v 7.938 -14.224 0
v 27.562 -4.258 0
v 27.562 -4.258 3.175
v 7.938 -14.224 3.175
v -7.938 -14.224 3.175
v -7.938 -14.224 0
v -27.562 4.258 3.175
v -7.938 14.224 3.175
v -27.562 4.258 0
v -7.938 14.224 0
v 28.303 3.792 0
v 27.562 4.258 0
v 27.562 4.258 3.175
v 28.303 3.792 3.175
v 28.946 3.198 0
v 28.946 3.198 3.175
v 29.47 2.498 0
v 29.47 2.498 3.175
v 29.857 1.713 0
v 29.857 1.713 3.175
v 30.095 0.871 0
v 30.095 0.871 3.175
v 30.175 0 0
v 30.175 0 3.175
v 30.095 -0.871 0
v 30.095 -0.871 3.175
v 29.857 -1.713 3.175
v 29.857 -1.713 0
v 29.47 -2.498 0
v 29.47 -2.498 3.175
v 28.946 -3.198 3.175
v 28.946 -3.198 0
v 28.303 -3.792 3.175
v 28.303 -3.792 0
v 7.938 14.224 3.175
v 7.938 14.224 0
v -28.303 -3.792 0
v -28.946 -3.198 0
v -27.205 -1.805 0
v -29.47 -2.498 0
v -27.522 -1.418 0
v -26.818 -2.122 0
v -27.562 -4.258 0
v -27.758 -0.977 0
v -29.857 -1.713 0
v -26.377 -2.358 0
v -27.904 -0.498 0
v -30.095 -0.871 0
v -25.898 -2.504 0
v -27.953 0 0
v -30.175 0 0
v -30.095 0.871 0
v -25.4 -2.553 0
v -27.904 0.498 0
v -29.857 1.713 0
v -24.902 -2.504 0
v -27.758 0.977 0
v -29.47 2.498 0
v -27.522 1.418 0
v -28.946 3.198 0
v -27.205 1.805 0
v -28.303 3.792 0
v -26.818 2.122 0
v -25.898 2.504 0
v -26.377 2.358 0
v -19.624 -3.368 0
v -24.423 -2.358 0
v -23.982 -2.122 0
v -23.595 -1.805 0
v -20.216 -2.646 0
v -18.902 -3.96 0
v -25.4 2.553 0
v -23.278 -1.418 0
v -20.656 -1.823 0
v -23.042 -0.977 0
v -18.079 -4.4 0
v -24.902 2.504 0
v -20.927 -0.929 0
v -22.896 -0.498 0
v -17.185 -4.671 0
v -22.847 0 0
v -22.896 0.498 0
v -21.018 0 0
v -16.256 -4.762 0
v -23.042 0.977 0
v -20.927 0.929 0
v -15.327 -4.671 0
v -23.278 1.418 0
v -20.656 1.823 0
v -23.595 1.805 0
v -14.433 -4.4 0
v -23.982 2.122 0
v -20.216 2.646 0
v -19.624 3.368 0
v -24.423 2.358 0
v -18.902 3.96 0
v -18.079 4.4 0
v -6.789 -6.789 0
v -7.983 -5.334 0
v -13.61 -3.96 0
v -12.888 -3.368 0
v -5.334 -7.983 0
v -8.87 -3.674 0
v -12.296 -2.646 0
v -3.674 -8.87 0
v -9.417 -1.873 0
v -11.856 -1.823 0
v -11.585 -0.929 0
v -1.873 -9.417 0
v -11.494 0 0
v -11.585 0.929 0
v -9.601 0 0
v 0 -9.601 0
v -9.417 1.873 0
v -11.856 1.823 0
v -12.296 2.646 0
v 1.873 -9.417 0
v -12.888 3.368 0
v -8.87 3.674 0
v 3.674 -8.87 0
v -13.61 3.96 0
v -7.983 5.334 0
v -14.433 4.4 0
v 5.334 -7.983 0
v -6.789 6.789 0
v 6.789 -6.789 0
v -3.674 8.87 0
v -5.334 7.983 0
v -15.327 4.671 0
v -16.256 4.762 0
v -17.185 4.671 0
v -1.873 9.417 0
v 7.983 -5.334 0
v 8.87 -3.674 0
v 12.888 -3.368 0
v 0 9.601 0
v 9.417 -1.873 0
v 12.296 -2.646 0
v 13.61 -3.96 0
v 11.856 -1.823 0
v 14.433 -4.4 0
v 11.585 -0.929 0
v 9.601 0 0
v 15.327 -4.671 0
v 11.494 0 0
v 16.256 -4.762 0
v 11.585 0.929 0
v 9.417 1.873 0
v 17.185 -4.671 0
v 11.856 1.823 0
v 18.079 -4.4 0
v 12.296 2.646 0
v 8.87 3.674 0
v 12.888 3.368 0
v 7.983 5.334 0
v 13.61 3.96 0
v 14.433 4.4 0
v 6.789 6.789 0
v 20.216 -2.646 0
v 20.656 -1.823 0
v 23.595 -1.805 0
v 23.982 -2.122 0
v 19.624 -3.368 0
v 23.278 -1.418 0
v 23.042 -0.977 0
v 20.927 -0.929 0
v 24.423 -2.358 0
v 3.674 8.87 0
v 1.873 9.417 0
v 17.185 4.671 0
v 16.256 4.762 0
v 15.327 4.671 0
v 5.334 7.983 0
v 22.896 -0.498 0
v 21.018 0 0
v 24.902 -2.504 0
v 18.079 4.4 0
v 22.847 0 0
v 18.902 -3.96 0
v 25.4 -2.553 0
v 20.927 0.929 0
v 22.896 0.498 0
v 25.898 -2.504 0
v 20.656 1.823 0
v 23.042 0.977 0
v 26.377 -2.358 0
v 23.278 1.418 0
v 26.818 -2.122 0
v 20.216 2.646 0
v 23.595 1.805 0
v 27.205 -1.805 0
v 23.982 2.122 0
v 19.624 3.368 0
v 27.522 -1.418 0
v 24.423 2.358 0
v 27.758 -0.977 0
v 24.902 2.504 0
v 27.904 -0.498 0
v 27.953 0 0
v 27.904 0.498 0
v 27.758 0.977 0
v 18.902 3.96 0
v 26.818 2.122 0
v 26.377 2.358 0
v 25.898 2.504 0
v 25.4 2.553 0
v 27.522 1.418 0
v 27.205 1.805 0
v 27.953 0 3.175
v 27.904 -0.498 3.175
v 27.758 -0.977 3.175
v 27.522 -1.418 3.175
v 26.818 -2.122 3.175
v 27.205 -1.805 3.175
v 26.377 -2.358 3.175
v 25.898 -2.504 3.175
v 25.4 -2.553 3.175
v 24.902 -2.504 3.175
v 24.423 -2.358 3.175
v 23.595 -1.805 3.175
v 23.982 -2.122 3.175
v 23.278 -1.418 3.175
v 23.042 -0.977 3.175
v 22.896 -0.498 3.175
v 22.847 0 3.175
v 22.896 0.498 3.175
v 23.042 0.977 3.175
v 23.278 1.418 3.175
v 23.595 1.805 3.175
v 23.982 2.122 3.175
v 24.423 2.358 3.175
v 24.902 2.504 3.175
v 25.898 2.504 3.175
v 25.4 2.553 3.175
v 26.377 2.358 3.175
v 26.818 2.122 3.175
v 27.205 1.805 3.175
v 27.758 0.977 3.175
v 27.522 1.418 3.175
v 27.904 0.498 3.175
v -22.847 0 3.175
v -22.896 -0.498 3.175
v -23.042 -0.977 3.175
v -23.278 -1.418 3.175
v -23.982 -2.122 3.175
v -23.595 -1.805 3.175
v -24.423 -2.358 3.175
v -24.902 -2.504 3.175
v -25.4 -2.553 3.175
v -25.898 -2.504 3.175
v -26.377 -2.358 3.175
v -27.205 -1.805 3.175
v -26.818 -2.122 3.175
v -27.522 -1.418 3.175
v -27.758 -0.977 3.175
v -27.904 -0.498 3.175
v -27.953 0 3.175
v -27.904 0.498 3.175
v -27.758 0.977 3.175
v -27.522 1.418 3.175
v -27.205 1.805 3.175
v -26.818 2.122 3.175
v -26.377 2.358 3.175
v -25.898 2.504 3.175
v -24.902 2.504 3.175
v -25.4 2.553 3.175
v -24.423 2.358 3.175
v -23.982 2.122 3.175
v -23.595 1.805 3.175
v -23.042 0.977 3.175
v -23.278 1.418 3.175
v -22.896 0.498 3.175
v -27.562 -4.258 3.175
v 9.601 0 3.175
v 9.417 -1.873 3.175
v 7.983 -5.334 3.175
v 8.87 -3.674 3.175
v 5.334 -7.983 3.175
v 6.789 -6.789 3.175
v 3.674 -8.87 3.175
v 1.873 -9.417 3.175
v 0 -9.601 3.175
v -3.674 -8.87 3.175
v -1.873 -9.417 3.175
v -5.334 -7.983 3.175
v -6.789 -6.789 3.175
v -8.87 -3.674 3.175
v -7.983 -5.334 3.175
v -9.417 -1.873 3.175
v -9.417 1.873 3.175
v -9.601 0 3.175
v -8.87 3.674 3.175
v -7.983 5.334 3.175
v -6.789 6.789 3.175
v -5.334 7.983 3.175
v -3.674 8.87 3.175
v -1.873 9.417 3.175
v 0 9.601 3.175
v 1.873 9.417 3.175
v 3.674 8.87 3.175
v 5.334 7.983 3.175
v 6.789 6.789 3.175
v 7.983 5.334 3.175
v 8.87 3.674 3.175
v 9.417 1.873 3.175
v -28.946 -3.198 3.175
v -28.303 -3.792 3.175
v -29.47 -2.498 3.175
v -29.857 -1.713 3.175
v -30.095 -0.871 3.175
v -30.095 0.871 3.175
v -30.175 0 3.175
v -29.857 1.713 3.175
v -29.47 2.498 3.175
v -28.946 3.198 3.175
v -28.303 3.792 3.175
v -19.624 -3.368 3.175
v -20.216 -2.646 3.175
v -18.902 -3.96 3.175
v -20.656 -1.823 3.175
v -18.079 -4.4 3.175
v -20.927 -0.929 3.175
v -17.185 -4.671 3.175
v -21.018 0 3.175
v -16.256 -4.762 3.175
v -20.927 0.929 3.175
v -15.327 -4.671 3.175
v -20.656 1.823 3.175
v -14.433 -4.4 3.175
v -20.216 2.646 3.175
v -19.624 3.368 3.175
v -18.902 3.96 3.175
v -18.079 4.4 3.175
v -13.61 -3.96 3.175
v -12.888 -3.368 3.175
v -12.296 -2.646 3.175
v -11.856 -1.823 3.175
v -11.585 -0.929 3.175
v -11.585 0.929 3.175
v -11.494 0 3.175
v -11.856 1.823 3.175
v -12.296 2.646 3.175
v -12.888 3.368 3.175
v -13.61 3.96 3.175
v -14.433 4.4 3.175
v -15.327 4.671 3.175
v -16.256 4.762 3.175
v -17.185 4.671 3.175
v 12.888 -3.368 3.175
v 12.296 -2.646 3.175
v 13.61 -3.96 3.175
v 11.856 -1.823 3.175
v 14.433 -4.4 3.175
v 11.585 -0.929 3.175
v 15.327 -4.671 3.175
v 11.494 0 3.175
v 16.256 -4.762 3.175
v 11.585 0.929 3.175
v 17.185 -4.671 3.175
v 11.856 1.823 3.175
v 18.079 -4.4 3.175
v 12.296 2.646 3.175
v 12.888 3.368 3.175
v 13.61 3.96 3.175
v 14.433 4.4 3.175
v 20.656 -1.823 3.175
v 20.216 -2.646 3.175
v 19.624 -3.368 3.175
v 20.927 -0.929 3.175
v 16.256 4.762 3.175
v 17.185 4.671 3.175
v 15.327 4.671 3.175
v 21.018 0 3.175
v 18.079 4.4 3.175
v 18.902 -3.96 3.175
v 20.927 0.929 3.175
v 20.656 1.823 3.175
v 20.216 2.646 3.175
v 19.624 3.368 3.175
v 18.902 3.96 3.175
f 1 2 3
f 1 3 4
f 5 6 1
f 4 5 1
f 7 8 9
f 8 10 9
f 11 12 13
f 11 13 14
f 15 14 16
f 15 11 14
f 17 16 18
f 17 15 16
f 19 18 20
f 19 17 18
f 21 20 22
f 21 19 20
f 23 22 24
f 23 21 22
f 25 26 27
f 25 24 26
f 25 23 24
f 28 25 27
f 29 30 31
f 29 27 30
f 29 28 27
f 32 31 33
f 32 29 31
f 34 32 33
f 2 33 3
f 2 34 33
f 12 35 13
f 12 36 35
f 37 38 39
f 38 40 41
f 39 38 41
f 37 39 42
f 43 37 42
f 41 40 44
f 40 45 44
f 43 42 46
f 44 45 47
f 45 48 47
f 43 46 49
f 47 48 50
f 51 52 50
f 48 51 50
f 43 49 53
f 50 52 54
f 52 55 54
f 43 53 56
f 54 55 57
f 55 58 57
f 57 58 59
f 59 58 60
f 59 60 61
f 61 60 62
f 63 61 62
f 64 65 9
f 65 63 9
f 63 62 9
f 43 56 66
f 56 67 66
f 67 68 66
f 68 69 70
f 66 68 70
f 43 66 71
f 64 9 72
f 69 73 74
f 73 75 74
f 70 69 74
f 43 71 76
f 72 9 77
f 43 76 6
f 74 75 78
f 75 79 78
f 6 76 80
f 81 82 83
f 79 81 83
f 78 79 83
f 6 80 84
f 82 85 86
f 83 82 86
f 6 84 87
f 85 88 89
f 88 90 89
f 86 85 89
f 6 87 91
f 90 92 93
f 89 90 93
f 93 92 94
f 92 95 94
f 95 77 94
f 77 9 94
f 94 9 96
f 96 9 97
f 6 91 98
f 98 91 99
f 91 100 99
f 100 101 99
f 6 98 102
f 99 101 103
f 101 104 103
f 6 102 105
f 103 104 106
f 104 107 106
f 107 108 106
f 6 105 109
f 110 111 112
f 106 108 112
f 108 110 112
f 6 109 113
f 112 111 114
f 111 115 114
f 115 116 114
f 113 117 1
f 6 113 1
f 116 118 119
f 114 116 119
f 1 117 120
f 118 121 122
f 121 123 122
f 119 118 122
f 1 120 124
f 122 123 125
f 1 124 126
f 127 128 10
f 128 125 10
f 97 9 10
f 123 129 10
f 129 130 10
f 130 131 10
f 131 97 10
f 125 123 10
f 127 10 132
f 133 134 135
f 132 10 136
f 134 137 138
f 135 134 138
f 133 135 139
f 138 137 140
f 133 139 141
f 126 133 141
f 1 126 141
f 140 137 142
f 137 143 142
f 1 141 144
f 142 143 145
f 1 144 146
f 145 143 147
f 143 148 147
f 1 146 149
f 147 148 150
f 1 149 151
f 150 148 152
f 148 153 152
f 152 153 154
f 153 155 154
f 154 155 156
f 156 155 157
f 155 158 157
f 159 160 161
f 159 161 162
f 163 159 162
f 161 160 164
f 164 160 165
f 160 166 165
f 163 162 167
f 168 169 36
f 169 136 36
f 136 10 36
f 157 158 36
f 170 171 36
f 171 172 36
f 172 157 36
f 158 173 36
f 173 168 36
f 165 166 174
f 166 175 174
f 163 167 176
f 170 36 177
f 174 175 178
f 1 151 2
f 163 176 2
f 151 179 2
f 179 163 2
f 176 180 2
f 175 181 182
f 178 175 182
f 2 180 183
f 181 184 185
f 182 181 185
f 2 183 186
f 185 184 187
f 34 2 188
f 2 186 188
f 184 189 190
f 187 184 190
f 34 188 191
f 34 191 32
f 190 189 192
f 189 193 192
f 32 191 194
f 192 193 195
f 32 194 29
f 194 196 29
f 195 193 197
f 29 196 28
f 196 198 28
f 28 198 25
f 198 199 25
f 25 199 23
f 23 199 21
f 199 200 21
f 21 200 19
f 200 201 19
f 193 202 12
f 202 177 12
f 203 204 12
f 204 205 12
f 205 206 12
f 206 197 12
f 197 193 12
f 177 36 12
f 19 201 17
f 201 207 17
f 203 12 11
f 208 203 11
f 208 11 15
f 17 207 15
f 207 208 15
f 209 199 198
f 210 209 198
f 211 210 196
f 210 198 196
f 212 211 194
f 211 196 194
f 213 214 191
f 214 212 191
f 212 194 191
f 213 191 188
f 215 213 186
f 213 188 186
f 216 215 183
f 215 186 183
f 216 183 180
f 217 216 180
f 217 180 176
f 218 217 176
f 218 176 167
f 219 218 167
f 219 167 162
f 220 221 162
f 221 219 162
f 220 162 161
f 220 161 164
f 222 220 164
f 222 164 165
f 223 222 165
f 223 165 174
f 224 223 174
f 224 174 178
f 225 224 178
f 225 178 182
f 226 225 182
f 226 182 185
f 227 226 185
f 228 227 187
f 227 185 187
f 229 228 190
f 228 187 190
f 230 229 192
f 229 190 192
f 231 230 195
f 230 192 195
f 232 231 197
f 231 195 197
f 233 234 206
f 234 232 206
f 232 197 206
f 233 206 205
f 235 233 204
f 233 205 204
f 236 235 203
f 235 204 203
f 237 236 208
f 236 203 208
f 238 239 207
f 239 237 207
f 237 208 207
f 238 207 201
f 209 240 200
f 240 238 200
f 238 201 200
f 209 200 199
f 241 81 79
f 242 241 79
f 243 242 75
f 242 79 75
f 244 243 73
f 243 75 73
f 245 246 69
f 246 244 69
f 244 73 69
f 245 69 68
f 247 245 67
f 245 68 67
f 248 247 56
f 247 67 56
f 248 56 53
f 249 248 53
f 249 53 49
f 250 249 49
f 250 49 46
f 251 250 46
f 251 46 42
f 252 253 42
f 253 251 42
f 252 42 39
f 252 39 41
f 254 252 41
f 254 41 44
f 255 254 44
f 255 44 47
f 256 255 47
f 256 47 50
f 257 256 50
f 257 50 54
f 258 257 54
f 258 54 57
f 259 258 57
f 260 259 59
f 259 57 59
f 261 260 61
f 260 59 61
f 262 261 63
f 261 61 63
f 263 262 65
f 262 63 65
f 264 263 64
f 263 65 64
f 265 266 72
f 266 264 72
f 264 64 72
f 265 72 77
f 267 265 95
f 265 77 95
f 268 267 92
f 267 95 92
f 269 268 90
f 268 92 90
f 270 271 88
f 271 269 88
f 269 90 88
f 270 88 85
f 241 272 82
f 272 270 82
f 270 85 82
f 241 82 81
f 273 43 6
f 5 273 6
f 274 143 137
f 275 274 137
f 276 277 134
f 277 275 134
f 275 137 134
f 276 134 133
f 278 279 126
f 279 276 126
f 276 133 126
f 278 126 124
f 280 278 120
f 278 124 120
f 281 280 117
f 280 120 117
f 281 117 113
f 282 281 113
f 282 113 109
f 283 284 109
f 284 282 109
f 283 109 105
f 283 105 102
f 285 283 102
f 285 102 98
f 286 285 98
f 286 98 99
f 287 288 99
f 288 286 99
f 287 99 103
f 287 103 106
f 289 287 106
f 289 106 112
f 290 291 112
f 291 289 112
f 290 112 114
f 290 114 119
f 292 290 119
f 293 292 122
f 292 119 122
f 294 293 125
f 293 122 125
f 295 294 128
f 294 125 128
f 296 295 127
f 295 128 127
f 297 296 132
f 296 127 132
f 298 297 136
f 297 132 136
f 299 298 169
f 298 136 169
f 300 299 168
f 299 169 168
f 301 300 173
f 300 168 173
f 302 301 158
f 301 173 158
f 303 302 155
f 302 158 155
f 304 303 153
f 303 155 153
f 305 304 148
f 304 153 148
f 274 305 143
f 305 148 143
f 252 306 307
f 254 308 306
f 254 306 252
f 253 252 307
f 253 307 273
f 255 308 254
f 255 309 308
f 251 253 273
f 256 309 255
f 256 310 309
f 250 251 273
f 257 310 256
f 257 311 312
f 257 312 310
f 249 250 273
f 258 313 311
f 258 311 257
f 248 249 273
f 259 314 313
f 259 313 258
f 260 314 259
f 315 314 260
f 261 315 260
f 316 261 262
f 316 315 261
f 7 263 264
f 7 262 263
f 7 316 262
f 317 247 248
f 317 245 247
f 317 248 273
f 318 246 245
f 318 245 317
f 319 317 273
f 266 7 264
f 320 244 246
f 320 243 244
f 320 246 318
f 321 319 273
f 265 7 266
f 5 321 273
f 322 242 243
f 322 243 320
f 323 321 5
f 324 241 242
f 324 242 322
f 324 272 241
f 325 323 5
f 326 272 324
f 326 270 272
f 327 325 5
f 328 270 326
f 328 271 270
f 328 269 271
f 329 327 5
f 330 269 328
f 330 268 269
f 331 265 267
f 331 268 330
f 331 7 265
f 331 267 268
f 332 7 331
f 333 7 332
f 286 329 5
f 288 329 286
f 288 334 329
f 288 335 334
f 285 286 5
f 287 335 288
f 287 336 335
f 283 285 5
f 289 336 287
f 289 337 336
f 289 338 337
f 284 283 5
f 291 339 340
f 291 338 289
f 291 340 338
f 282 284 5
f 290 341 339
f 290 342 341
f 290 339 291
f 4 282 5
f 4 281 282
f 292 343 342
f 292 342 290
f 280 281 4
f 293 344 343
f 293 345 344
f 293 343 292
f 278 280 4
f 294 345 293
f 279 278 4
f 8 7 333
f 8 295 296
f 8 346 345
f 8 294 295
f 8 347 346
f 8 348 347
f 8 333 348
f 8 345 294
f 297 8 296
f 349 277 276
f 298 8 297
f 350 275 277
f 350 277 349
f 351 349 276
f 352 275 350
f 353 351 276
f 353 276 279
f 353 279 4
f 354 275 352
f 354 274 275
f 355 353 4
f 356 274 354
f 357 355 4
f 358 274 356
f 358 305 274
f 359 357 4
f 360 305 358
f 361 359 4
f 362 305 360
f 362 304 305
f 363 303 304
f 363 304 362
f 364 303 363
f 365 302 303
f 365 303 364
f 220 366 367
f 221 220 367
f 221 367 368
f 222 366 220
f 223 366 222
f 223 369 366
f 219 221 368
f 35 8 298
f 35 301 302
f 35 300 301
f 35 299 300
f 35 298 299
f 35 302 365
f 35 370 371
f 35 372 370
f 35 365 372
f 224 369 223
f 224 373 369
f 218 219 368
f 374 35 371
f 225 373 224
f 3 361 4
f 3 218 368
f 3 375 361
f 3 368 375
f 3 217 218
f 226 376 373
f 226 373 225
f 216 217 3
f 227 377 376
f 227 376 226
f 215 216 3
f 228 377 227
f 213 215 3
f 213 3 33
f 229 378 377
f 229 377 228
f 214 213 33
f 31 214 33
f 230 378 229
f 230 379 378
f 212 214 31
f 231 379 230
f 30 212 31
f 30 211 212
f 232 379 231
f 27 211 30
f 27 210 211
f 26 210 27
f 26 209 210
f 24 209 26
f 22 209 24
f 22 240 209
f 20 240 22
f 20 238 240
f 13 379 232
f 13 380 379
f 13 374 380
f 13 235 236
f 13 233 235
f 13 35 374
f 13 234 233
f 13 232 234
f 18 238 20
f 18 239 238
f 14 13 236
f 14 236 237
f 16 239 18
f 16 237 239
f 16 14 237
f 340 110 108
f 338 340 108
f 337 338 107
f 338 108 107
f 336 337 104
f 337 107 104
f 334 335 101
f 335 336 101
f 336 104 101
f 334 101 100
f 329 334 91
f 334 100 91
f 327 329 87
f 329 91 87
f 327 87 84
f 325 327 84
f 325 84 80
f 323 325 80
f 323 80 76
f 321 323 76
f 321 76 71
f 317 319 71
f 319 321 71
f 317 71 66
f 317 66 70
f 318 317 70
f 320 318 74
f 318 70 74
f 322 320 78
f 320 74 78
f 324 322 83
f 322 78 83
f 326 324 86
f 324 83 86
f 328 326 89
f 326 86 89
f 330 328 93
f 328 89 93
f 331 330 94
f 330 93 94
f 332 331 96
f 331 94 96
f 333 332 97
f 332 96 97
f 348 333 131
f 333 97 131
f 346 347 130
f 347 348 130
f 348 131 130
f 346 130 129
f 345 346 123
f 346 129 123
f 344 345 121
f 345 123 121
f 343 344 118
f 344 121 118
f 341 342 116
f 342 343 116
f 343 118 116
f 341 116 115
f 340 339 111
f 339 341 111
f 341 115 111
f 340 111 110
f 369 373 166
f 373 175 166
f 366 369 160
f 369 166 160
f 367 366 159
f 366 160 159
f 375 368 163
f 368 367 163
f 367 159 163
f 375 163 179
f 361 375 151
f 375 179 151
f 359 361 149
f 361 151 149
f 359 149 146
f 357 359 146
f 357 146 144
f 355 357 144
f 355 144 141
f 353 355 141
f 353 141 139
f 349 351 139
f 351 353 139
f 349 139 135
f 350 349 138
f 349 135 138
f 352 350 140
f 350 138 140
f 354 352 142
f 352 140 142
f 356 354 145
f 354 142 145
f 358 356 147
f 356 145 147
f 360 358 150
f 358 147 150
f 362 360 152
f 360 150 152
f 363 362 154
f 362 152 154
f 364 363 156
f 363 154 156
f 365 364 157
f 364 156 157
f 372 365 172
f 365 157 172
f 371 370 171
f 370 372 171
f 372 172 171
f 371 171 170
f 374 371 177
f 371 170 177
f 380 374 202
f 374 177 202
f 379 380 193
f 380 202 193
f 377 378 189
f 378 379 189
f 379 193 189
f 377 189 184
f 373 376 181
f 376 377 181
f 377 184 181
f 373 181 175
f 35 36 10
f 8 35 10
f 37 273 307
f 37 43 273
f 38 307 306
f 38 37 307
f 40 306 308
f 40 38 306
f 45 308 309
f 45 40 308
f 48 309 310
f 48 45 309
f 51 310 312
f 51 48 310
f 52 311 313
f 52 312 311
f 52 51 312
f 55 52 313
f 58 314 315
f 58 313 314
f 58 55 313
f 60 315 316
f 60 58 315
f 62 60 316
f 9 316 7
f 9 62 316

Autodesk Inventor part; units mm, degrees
ref_plane "YZ Plane" through (0, 0, 0) normal (1, 0, 0) x (0, 1, 0)
ref_plane "XZ Plane" through (0, 0, 0) normal (0, 1, 0) x (-1, 0, 0)
ref_plane "XY Plane" through (0, 0, 0) normal (0, 0, 1) x (1, 0, 0)
sketch "Sketch1" plane through (0, 0, 0) normal (0, 0, 1) x (1, 0, 0)
  circle A0 centre (0, 0) radius 9.6012
  circle A1 centre (-16.256, 0) radius 4.7625
  circle A2 centre (16.256, 0) radius 4.7625
  line L0 (7.9375, 14.224) -> (-7.9375, 14.224)
  line L1 (-7.9375, 14.224) -> (-27.5622, 4.2576)
  circle A3 centre (-25.4, 0) radius 2.5527
  arc A4 (-27.5622, 4.2576) -> (-27.5622, -4.2576) centre (-25.4, 0) ccw
  line L2 (-27.5622, -4.2576) -> (-7.9375, -14.224)
  line L3 (-7.9375, -14.224) -> (7.9375, -14.224)
  circle A5 centre (25.4, 0) radius 2.5527
  arc A6 (27.5622, -4.2576) -> (27.5622, 4.2576) centre (25.4, 0) ccw
  line L4 (7.9375, 14.224) -> (27.5622, 4.2576)
  line L5 (27.5622, -4.2576) -> (7.9375, -14.224)
  point P0 (0, 14.224)
  point P1 (0, -14.224)
  dimension "d0" = 19.2024
  dimension "d1" = 9.525
  dimension "d2" = 16.256
  dimension "d3" = 16.256
  dimension "d4" = 15.875
  dimension "d5" = 5.1054
  dimension "d6" = 25.4
  dimension "d7" = 4.7752
  dimension "d8" = 28.448
  dimension "d9" = 5.1054
  dimension "d10" = 25.4
  dimension "d11" = 4.7752
  dimension "d12" = 14.224
extrude "Extrusion1" add sketch "Sketch1" along normal blind 3.175
equation "\"d3\" = d2"
equation "\"d10\" = d6"
equation "\"d12\" = 0.5 * d8"
properties part number "CIM Spacer" material "Aluminum 6061"
